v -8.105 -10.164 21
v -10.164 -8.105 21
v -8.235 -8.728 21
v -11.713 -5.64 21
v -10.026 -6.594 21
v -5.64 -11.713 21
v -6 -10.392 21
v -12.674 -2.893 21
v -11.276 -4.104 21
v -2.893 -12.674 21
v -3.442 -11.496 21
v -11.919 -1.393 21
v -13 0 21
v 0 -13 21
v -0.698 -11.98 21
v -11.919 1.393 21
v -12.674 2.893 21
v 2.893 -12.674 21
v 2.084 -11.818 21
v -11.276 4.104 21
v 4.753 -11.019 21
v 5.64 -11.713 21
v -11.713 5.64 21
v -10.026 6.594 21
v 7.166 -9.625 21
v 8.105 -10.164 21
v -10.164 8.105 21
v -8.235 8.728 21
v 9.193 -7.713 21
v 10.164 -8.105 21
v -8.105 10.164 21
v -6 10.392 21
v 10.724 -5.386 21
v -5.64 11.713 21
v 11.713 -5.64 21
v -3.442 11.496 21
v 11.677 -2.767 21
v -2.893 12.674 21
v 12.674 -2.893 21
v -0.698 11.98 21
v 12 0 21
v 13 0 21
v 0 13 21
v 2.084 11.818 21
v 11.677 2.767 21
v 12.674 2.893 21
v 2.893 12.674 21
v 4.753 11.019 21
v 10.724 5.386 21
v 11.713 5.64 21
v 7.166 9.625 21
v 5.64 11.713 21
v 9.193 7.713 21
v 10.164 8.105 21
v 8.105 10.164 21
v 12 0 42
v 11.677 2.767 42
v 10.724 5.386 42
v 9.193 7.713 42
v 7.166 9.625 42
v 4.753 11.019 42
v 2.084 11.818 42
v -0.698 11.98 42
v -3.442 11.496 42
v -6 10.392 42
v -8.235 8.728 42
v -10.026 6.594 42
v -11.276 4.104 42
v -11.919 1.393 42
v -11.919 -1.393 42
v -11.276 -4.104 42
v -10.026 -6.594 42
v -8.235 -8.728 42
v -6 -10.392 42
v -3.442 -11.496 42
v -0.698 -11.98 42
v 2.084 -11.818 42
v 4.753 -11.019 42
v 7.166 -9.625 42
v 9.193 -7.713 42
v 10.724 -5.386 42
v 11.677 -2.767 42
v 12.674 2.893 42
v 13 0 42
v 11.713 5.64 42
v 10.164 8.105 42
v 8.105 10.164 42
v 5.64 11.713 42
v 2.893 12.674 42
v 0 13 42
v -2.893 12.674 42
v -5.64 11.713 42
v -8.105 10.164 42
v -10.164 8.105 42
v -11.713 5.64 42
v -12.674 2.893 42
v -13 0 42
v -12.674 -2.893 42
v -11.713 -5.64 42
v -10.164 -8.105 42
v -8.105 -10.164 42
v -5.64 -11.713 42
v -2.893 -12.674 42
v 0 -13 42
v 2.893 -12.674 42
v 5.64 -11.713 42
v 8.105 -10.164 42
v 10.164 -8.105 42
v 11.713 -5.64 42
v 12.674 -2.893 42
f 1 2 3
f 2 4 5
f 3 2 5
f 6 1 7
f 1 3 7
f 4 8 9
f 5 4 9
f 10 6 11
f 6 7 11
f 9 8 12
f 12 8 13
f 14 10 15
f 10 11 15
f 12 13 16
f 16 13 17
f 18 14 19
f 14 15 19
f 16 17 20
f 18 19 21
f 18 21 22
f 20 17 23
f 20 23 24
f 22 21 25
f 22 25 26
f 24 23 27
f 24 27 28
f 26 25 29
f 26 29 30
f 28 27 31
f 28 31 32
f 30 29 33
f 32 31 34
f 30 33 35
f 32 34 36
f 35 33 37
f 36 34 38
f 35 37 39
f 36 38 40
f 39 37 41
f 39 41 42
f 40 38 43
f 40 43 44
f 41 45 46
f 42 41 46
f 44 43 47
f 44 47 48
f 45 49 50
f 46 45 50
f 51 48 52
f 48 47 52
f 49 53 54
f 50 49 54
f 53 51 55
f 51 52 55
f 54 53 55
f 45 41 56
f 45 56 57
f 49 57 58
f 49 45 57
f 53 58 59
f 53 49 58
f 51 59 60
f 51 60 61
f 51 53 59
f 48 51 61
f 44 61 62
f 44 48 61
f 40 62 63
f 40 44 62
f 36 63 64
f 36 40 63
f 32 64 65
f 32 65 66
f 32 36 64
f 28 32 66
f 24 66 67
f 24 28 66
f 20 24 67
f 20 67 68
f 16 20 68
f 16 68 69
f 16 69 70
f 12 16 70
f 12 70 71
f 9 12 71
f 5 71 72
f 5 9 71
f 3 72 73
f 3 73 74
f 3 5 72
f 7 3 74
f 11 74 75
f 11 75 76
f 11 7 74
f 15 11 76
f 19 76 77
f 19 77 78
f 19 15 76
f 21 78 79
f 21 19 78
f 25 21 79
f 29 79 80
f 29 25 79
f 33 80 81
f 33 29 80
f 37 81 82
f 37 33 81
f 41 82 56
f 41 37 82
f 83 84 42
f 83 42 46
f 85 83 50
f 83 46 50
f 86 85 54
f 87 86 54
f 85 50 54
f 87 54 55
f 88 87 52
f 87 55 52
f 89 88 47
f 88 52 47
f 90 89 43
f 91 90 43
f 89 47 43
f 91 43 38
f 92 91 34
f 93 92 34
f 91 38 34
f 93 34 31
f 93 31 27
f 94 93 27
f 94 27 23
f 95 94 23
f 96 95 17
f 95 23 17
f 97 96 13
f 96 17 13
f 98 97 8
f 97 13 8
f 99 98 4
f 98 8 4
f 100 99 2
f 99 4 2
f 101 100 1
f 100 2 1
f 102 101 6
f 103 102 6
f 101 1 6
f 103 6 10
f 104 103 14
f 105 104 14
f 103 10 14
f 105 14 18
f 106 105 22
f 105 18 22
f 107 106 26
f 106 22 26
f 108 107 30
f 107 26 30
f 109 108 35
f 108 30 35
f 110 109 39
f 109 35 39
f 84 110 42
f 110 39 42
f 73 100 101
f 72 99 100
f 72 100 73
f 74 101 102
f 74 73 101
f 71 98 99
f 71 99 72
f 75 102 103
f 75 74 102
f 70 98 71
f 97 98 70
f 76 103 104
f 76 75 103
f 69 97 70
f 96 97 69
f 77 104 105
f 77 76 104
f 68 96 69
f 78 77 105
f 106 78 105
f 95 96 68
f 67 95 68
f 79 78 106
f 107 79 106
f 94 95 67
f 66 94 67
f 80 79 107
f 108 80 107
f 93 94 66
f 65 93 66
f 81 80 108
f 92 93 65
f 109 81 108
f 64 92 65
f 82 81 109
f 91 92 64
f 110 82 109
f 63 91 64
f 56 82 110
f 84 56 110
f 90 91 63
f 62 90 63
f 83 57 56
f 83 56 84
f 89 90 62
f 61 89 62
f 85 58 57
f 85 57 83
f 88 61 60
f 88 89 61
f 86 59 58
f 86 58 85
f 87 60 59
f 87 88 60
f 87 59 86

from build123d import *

# Parameters (mm, degrees)
CYLINDER011_R     = 12
CYLINDER011_DEPTH = 21
CYLINDER010_R     = 13
CYLINDER010_DEPTH = 21


with BuildPart() as cylinder006:
    # Cylinder011 → Cylinder011 (new body)
    with BuildSketch(Plane.XY):
        Circle(CYLINDER011_R)
    extrude(amount=CYLINDER011_DEPTH)


with BuildPart() as cut006:
    # Cylinder010 → Cylinder010 (new body)
    with BuildSketch(Plane.XY):
        Circle(CYLINDER010_R)
    extrude(amount=CYLINDER010_DEPTH)

    # Cut006: cut Cylinder006
    add(cylinder006.part, mode=Mode.SUBTRACT)


with BuildPart() as cut006_1:
    # Cut006 placement: moved
    add(cut006.part.moved(Location((0, 0, 21))))


solid = cut006_1.part
